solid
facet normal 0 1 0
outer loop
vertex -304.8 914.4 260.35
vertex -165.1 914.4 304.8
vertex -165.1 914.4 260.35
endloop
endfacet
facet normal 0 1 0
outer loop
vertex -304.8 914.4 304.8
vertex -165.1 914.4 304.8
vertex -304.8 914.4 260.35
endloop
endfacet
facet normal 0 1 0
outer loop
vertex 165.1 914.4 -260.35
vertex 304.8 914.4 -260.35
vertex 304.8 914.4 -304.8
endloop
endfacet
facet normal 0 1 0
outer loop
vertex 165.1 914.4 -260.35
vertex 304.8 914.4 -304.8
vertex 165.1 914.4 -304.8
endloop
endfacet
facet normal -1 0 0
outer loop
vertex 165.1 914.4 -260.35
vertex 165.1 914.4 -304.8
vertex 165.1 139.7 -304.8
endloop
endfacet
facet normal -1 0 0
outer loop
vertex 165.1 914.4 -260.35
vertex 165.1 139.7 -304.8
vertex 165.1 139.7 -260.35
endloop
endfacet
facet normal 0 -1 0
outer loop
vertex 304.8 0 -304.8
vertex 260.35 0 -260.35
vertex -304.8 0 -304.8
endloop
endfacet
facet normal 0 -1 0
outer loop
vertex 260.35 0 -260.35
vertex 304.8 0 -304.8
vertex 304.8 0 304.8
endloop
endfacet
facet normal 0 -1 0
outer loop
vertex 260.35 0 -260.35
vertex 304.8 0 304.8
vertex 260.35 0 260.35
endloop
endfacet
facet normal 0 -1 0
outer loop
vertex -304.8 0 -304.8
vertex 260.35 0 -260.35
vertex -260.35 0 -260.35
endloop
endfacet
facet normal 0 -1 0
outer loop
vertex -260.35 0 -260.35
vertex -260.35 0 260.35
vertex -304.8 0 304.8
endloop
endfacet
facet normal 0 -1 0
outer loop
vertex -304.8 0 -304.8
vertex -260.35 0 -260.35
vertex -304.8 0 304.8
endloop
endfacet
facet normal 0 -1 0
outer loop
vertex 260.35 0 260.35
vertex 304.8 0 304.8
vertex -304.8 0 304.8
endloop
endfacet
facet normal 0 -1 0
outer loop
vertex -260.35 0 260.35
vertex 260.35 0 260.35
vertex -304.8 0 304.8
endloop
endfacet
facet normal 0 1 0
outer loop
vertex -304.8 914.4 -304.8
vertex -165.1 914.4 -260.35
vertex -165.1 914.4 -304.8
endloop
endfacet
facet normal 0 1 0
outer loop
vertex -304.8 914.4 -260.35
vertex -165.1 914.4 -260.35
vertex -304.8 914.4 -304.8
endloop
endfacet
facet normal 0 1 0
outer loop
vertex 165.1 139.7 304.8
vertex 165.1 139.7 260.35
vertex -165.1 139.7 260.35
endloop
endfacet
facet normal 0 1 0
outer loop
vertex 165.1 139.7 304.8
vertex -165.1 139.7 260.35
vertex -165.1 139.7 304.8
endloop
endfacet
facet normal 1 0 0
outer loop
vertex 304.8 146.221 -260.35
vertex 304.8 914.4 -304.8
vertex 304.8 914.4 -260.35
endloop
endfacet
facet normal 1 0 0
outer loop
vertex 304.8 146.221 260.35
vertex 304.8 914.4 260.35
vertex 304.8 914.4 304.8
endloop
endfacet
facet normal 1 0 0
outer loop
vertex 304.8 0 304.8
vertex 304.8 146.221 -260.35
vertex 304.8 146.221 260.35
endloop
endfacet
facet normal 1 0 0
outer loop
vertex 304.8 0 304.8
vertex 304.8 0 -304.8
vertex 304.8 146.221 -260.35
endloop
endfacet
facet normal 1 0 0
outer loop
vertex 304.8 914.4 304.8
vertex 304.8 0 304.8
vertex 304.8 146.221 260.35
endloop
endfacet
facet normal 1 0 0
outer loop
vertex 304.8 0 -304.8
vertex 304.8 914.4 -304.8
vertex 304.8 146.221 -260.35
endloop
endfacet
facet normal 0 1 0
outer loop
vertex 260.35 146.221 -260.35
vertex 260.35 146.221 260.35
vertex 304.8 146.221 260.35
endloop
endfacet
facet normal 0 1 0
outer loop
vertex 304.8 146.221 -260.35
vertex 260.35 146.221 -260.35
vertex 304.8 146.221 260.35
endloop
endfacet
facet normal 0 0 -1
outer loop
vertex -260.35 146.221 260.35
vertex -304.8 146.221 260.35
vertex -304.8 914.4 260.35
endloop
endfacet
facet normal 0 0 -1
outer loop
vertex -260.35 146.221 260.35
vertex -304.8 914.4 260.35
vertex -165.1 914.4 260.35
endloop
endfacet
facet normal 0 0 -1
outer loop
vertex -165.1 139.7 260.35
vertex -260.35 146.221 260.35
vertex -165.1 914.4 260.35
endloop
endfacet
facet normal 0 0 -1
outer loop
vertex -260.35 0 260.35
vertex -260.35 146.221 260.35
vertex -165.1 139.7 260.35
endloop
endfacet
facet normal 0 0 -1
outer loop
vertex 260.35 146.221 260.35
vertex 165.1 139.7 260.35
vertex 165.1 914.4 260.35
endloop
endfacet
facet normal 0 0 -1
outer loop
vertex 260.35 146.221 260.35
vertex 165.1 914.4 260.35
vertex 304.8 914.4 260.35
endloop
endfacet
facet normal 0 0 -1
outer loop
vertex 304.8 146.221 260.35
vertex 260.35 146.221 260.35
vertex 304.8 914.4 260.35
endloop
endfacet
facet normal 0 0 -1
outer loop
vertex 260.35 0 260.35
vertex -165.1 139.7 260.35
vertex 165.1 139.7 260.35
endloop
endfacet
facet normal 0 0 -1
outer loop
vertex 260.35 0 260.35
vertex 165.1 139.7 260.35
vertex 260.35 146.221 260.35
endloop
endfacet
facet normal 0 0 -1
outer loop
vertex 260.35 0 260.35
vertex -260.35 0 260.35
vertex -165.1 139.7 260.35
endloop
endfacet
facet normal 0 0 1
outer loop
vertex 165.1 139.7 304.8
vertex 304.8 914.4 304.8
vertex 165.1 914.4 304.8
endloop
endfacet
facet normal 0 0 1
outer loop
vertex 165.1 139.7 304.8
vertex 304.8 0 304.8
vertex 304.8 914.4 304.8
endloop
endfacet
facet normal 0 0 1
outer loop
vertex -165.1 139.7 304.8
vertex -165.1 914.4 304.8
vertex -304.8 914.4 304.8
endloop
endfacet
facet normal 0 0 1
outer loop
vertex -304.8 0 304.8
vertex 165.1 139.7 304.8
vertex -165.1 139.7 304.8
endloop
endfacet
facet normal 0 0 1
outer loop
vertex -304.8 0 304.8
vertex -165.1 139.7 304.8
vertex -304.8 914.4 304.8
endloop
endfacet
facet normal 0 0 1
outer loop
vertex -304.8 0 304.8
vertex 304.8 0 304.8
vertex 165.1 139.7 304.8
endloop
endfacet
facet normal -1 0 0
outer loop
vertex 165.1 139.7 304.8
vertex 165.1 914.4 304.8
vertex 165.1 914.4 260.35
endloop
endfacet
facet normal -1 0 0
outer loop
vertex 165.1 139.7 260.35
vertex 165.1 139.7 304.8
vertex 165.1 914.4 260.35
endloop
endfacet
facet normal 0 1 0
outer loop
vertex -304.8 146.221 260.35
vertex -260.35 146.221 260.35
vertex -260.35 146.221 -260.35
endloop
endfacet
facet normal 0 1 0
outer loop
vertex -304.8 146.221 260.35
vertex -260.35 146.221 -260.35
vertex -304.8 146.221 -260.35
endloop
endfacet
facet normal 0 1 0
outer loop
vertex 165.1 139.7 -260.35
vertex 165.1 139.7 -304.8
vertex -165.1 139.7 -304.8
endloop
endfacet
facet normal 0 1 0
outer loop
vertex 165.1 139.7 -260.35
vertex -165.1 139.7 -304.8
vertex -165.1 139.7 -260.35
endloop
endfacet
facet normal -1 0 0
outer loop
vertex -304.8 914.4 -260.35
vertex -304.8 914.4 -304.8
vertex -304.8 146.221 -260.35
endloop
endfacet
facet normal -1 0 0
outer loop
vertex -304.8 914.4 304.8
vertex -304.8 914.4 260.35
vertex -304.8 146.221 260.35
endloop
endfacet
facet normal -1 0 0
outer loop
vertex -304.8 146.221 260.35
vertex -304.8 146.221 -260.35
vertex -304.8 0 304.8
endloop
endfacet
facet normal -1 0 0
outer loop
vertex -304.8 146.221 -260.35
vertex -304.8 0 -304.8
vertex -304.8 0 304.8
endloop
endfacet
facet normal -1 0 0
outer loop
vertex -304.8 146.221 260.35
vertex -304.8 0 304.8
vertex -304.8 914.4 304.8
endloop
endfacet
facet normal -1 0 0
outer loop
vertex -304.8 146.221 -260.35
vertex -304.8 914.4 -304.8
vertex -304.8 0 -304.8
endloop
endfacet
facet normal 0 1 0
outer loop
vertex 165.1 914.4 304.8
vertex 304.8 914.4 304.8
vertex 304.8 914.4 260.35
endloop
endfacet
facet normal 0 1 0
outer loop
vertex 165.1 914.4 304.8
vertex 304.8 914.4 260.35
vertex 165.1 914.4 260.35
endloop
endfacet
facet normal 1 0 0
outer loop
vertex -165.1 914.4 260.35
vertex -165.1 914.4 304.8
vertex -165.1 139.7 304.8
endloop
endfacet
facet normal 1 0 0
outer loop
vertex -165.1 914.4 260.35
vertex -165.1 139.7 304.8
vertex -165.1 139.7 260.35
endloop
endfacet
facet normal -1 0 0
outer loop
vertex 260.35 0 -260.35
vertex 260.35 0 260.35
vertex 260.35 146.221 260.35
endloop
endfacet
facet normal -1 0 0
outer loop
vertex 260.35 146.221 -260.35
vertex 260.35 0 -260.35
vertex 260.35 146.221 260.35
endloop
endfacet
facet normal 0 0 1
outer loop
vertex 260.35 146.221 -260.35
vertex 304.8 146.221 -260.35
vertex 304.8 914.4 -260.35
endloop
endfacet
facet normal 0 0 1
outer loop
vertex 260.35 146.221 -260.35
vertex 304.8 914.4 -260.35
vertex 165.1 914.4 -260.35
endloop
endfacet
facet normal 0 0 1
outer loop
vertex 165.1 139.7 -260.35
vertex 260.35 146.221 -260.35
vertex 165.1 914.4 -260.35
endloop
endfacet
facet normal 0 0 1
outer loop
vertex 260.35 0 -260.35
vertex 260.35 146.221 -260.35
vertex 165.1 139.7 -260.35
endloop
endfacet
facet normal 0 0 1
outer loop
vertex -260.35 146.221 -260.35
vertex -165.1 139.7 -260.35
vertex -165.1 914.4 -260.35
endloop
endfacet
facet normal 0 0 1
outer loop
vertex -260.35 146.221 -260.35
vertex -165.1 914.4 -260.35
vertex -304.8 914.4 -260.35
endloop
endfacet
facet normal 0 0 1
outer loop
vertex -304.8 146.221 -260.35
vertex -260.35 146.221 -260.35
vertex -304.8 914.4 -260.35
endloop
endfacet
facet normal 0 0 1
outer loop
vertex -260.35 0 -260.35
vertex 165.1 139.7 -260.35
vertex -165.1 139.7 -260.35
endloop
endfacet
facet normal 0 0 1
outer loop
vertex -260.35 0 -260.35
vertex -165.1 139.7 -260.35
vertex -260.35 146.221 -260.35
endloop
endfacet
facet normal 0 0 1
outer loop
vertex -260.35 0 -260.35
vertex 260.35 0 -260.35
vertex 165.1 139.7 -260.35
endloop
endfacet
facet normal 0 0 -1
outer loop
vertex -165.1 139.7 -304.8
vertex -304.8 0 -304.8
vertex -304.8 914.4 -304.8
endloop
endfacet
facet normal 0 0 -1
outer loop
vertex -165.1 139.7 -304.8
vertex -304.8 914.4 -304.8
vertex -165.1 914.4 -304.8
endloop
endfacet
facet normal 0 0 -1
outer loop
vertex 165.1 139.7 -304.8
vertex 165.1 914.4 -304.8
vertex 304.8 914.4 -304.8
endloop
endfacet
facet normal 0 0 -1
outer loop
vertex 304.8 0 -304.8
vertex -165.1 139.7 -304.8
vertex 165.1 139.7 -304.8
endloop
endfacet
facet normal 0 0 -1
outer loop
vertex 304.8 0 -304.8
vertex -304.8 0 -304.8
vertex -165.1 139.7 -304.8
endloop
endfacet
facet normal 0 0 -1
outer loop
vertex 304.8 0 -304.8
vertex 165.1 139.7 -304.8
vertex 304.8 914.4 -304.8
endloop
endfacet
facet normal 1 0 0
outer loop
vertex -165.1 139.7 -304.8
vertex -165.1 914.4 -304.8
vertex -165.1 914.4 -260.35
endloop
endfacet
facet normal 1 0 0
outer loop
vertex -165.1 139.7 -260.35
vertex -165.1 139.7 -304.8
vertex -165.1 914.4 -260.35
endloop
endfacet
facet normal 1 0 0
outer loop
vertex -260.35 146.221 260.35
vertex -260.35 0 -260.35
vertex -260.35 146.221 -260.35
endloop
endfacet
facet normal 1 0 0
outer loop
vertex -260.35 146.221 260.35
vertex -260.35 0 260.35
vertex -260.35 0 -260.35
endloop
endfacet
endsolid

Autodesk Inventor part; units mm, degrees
ref_plane "YZ Plane" through (0, 0, 0) normal (1, 0, 0) x (0, 1, 0)
ref_plane "XZ Plane" through (0, 0, 0) normal (0, 1, 0) x (-1, 0, 0)
ref_plane "XY Plane" through (0, 0, 0) normal (0, 0, 1) x (1, 0, 0)
sketch "Sketch1" plane through (0, 0, 0) normal (0, 1, 0) x (-1, 0, 0)
  line L0 (-304.8, 304.8) -> (-304.8, -304.8) construction
  line L1 (-304.8, -304.8) -> (304.8, -304.8) construction
  line L2 (304.8, -304.8) -> (304.8, 304.8) construction
  line L3 (304.8, 304.8) -> (-304.8, 304.8) construction
  line L4 (-304.8, 304.8) -> (304.8, -304.8) construction
  line L5 (-304.8, -304.8) -> (304.8, 304.8) construction
  line L6 (-304.8, 304.8) -> (-165.1, 304.8)
  line L7 (-165.1, 304.8) -> (-165.1, 260.35)
  line L8 (-165.1, 260.35) -> (-304.8, 260.35)
  line L9 (-304.8, 260.35) -> (-304.8, 304.8)
  line L10 (304.8, 304.8) -> (165.1, 304.8)
  line L11 (165.1, 304.8) -> (165.1, 260.35)
  line L12 (165.1, 260.35) -> (304.8, 260.35)
  line L13 (304.8, 260.35) -> (304.8, 304.8)
  line L14 (304.8, -304.8) -> (165.1, -304.8)
  line L15 (165.1, -304.8) -> (165.1, -260.35)
  line L16 (165.1, -260.35) -> (304.8, -260.35)
  line L17 (304.8, -260.35) -> (304.8, -304.8)
  line L18 (-304.8, -304.8) -> (-165.1, -304.8)
  line L19 (-165.1, -304.8) -> (-165.1, -260.35)
  line L20 (-165.1, -260.35) -> (-304.8, -260.35)
  line L21 (-304.8, -260.35) -> (-304.8, -304.8)
  point P0 (0, 0)
  dimension "d0" = 609.6
  dimension "d1" = 609.6
  dimension "d2" = 44.45
  dimension "d3" = 139.7
extrude "Extrusion1" add sketch "Sketch1" along normal blind 914.4
sketch "Sketch2" plane through (-165.1, 0, 304.8) normal (1, 0, 0) x (0, 0, -1)
  line L0 (44.45, 0) -> (44.45, 914.4) projected
  line L1 (0, 0) -> (44.45, 0)
  line L2 (44.45, 0) -> (44.45, 139.7)
  line L3 (44.45, 139.7) -> (0, 139.7)
  line L4 (0, 139.7) -> (0, 0)
  line L5 (565.15, 0) -> (565.15, 914.4) projected
  line L6 (609.6, 0) -> (609.6, 914.4) projected
  line L7 (565.15, 0) -> (609.6, 0)
  line L8 (609.6, 0) -> (609.6, 139.7)
  line L9 (609.6, 139.7) -> (565.15, 139.7)
  line L10 (565.15, 139.7) -> (565.15, 0)
  point P0 (304.8, 0)
  dimension "d6" = 139.7
extrude "Extrusion2" add sketch "Sketch2" along normal up to next
sketch "Sketch3" plane through (304.8, 0, 260.35) normal (0, 0, -1) x (-1, 0, 0)
  line L0 (0, 0) -> (44.45, 0)
  line L1 (44.45, 0) -> (44.45, 146.2209)
  line L2 (44.45, 146.2209) -> (0, 146.2209)
  line L3 (0, 146.2209) -> (0, 0)
  line L4 (609.6, 0) -> (0, 0) projected
  line L5 (609.6, 0) -> (565.15, 0)
  line L6 (565.15, 0) -> (565.15, 146.2209)
  line L7 (565.15, 146.2209) -> (609.6, 146.2209)
  line L8 (609.6, 146.2209) -> (609.6, 0)
  point P0 (304.8, 0)
  dimension "d9" = 44.45
extrude "Extrusion3" add sketch "Sketch3" along normal up to next
properties part number "WindShield" material "Wood (Birch)"
